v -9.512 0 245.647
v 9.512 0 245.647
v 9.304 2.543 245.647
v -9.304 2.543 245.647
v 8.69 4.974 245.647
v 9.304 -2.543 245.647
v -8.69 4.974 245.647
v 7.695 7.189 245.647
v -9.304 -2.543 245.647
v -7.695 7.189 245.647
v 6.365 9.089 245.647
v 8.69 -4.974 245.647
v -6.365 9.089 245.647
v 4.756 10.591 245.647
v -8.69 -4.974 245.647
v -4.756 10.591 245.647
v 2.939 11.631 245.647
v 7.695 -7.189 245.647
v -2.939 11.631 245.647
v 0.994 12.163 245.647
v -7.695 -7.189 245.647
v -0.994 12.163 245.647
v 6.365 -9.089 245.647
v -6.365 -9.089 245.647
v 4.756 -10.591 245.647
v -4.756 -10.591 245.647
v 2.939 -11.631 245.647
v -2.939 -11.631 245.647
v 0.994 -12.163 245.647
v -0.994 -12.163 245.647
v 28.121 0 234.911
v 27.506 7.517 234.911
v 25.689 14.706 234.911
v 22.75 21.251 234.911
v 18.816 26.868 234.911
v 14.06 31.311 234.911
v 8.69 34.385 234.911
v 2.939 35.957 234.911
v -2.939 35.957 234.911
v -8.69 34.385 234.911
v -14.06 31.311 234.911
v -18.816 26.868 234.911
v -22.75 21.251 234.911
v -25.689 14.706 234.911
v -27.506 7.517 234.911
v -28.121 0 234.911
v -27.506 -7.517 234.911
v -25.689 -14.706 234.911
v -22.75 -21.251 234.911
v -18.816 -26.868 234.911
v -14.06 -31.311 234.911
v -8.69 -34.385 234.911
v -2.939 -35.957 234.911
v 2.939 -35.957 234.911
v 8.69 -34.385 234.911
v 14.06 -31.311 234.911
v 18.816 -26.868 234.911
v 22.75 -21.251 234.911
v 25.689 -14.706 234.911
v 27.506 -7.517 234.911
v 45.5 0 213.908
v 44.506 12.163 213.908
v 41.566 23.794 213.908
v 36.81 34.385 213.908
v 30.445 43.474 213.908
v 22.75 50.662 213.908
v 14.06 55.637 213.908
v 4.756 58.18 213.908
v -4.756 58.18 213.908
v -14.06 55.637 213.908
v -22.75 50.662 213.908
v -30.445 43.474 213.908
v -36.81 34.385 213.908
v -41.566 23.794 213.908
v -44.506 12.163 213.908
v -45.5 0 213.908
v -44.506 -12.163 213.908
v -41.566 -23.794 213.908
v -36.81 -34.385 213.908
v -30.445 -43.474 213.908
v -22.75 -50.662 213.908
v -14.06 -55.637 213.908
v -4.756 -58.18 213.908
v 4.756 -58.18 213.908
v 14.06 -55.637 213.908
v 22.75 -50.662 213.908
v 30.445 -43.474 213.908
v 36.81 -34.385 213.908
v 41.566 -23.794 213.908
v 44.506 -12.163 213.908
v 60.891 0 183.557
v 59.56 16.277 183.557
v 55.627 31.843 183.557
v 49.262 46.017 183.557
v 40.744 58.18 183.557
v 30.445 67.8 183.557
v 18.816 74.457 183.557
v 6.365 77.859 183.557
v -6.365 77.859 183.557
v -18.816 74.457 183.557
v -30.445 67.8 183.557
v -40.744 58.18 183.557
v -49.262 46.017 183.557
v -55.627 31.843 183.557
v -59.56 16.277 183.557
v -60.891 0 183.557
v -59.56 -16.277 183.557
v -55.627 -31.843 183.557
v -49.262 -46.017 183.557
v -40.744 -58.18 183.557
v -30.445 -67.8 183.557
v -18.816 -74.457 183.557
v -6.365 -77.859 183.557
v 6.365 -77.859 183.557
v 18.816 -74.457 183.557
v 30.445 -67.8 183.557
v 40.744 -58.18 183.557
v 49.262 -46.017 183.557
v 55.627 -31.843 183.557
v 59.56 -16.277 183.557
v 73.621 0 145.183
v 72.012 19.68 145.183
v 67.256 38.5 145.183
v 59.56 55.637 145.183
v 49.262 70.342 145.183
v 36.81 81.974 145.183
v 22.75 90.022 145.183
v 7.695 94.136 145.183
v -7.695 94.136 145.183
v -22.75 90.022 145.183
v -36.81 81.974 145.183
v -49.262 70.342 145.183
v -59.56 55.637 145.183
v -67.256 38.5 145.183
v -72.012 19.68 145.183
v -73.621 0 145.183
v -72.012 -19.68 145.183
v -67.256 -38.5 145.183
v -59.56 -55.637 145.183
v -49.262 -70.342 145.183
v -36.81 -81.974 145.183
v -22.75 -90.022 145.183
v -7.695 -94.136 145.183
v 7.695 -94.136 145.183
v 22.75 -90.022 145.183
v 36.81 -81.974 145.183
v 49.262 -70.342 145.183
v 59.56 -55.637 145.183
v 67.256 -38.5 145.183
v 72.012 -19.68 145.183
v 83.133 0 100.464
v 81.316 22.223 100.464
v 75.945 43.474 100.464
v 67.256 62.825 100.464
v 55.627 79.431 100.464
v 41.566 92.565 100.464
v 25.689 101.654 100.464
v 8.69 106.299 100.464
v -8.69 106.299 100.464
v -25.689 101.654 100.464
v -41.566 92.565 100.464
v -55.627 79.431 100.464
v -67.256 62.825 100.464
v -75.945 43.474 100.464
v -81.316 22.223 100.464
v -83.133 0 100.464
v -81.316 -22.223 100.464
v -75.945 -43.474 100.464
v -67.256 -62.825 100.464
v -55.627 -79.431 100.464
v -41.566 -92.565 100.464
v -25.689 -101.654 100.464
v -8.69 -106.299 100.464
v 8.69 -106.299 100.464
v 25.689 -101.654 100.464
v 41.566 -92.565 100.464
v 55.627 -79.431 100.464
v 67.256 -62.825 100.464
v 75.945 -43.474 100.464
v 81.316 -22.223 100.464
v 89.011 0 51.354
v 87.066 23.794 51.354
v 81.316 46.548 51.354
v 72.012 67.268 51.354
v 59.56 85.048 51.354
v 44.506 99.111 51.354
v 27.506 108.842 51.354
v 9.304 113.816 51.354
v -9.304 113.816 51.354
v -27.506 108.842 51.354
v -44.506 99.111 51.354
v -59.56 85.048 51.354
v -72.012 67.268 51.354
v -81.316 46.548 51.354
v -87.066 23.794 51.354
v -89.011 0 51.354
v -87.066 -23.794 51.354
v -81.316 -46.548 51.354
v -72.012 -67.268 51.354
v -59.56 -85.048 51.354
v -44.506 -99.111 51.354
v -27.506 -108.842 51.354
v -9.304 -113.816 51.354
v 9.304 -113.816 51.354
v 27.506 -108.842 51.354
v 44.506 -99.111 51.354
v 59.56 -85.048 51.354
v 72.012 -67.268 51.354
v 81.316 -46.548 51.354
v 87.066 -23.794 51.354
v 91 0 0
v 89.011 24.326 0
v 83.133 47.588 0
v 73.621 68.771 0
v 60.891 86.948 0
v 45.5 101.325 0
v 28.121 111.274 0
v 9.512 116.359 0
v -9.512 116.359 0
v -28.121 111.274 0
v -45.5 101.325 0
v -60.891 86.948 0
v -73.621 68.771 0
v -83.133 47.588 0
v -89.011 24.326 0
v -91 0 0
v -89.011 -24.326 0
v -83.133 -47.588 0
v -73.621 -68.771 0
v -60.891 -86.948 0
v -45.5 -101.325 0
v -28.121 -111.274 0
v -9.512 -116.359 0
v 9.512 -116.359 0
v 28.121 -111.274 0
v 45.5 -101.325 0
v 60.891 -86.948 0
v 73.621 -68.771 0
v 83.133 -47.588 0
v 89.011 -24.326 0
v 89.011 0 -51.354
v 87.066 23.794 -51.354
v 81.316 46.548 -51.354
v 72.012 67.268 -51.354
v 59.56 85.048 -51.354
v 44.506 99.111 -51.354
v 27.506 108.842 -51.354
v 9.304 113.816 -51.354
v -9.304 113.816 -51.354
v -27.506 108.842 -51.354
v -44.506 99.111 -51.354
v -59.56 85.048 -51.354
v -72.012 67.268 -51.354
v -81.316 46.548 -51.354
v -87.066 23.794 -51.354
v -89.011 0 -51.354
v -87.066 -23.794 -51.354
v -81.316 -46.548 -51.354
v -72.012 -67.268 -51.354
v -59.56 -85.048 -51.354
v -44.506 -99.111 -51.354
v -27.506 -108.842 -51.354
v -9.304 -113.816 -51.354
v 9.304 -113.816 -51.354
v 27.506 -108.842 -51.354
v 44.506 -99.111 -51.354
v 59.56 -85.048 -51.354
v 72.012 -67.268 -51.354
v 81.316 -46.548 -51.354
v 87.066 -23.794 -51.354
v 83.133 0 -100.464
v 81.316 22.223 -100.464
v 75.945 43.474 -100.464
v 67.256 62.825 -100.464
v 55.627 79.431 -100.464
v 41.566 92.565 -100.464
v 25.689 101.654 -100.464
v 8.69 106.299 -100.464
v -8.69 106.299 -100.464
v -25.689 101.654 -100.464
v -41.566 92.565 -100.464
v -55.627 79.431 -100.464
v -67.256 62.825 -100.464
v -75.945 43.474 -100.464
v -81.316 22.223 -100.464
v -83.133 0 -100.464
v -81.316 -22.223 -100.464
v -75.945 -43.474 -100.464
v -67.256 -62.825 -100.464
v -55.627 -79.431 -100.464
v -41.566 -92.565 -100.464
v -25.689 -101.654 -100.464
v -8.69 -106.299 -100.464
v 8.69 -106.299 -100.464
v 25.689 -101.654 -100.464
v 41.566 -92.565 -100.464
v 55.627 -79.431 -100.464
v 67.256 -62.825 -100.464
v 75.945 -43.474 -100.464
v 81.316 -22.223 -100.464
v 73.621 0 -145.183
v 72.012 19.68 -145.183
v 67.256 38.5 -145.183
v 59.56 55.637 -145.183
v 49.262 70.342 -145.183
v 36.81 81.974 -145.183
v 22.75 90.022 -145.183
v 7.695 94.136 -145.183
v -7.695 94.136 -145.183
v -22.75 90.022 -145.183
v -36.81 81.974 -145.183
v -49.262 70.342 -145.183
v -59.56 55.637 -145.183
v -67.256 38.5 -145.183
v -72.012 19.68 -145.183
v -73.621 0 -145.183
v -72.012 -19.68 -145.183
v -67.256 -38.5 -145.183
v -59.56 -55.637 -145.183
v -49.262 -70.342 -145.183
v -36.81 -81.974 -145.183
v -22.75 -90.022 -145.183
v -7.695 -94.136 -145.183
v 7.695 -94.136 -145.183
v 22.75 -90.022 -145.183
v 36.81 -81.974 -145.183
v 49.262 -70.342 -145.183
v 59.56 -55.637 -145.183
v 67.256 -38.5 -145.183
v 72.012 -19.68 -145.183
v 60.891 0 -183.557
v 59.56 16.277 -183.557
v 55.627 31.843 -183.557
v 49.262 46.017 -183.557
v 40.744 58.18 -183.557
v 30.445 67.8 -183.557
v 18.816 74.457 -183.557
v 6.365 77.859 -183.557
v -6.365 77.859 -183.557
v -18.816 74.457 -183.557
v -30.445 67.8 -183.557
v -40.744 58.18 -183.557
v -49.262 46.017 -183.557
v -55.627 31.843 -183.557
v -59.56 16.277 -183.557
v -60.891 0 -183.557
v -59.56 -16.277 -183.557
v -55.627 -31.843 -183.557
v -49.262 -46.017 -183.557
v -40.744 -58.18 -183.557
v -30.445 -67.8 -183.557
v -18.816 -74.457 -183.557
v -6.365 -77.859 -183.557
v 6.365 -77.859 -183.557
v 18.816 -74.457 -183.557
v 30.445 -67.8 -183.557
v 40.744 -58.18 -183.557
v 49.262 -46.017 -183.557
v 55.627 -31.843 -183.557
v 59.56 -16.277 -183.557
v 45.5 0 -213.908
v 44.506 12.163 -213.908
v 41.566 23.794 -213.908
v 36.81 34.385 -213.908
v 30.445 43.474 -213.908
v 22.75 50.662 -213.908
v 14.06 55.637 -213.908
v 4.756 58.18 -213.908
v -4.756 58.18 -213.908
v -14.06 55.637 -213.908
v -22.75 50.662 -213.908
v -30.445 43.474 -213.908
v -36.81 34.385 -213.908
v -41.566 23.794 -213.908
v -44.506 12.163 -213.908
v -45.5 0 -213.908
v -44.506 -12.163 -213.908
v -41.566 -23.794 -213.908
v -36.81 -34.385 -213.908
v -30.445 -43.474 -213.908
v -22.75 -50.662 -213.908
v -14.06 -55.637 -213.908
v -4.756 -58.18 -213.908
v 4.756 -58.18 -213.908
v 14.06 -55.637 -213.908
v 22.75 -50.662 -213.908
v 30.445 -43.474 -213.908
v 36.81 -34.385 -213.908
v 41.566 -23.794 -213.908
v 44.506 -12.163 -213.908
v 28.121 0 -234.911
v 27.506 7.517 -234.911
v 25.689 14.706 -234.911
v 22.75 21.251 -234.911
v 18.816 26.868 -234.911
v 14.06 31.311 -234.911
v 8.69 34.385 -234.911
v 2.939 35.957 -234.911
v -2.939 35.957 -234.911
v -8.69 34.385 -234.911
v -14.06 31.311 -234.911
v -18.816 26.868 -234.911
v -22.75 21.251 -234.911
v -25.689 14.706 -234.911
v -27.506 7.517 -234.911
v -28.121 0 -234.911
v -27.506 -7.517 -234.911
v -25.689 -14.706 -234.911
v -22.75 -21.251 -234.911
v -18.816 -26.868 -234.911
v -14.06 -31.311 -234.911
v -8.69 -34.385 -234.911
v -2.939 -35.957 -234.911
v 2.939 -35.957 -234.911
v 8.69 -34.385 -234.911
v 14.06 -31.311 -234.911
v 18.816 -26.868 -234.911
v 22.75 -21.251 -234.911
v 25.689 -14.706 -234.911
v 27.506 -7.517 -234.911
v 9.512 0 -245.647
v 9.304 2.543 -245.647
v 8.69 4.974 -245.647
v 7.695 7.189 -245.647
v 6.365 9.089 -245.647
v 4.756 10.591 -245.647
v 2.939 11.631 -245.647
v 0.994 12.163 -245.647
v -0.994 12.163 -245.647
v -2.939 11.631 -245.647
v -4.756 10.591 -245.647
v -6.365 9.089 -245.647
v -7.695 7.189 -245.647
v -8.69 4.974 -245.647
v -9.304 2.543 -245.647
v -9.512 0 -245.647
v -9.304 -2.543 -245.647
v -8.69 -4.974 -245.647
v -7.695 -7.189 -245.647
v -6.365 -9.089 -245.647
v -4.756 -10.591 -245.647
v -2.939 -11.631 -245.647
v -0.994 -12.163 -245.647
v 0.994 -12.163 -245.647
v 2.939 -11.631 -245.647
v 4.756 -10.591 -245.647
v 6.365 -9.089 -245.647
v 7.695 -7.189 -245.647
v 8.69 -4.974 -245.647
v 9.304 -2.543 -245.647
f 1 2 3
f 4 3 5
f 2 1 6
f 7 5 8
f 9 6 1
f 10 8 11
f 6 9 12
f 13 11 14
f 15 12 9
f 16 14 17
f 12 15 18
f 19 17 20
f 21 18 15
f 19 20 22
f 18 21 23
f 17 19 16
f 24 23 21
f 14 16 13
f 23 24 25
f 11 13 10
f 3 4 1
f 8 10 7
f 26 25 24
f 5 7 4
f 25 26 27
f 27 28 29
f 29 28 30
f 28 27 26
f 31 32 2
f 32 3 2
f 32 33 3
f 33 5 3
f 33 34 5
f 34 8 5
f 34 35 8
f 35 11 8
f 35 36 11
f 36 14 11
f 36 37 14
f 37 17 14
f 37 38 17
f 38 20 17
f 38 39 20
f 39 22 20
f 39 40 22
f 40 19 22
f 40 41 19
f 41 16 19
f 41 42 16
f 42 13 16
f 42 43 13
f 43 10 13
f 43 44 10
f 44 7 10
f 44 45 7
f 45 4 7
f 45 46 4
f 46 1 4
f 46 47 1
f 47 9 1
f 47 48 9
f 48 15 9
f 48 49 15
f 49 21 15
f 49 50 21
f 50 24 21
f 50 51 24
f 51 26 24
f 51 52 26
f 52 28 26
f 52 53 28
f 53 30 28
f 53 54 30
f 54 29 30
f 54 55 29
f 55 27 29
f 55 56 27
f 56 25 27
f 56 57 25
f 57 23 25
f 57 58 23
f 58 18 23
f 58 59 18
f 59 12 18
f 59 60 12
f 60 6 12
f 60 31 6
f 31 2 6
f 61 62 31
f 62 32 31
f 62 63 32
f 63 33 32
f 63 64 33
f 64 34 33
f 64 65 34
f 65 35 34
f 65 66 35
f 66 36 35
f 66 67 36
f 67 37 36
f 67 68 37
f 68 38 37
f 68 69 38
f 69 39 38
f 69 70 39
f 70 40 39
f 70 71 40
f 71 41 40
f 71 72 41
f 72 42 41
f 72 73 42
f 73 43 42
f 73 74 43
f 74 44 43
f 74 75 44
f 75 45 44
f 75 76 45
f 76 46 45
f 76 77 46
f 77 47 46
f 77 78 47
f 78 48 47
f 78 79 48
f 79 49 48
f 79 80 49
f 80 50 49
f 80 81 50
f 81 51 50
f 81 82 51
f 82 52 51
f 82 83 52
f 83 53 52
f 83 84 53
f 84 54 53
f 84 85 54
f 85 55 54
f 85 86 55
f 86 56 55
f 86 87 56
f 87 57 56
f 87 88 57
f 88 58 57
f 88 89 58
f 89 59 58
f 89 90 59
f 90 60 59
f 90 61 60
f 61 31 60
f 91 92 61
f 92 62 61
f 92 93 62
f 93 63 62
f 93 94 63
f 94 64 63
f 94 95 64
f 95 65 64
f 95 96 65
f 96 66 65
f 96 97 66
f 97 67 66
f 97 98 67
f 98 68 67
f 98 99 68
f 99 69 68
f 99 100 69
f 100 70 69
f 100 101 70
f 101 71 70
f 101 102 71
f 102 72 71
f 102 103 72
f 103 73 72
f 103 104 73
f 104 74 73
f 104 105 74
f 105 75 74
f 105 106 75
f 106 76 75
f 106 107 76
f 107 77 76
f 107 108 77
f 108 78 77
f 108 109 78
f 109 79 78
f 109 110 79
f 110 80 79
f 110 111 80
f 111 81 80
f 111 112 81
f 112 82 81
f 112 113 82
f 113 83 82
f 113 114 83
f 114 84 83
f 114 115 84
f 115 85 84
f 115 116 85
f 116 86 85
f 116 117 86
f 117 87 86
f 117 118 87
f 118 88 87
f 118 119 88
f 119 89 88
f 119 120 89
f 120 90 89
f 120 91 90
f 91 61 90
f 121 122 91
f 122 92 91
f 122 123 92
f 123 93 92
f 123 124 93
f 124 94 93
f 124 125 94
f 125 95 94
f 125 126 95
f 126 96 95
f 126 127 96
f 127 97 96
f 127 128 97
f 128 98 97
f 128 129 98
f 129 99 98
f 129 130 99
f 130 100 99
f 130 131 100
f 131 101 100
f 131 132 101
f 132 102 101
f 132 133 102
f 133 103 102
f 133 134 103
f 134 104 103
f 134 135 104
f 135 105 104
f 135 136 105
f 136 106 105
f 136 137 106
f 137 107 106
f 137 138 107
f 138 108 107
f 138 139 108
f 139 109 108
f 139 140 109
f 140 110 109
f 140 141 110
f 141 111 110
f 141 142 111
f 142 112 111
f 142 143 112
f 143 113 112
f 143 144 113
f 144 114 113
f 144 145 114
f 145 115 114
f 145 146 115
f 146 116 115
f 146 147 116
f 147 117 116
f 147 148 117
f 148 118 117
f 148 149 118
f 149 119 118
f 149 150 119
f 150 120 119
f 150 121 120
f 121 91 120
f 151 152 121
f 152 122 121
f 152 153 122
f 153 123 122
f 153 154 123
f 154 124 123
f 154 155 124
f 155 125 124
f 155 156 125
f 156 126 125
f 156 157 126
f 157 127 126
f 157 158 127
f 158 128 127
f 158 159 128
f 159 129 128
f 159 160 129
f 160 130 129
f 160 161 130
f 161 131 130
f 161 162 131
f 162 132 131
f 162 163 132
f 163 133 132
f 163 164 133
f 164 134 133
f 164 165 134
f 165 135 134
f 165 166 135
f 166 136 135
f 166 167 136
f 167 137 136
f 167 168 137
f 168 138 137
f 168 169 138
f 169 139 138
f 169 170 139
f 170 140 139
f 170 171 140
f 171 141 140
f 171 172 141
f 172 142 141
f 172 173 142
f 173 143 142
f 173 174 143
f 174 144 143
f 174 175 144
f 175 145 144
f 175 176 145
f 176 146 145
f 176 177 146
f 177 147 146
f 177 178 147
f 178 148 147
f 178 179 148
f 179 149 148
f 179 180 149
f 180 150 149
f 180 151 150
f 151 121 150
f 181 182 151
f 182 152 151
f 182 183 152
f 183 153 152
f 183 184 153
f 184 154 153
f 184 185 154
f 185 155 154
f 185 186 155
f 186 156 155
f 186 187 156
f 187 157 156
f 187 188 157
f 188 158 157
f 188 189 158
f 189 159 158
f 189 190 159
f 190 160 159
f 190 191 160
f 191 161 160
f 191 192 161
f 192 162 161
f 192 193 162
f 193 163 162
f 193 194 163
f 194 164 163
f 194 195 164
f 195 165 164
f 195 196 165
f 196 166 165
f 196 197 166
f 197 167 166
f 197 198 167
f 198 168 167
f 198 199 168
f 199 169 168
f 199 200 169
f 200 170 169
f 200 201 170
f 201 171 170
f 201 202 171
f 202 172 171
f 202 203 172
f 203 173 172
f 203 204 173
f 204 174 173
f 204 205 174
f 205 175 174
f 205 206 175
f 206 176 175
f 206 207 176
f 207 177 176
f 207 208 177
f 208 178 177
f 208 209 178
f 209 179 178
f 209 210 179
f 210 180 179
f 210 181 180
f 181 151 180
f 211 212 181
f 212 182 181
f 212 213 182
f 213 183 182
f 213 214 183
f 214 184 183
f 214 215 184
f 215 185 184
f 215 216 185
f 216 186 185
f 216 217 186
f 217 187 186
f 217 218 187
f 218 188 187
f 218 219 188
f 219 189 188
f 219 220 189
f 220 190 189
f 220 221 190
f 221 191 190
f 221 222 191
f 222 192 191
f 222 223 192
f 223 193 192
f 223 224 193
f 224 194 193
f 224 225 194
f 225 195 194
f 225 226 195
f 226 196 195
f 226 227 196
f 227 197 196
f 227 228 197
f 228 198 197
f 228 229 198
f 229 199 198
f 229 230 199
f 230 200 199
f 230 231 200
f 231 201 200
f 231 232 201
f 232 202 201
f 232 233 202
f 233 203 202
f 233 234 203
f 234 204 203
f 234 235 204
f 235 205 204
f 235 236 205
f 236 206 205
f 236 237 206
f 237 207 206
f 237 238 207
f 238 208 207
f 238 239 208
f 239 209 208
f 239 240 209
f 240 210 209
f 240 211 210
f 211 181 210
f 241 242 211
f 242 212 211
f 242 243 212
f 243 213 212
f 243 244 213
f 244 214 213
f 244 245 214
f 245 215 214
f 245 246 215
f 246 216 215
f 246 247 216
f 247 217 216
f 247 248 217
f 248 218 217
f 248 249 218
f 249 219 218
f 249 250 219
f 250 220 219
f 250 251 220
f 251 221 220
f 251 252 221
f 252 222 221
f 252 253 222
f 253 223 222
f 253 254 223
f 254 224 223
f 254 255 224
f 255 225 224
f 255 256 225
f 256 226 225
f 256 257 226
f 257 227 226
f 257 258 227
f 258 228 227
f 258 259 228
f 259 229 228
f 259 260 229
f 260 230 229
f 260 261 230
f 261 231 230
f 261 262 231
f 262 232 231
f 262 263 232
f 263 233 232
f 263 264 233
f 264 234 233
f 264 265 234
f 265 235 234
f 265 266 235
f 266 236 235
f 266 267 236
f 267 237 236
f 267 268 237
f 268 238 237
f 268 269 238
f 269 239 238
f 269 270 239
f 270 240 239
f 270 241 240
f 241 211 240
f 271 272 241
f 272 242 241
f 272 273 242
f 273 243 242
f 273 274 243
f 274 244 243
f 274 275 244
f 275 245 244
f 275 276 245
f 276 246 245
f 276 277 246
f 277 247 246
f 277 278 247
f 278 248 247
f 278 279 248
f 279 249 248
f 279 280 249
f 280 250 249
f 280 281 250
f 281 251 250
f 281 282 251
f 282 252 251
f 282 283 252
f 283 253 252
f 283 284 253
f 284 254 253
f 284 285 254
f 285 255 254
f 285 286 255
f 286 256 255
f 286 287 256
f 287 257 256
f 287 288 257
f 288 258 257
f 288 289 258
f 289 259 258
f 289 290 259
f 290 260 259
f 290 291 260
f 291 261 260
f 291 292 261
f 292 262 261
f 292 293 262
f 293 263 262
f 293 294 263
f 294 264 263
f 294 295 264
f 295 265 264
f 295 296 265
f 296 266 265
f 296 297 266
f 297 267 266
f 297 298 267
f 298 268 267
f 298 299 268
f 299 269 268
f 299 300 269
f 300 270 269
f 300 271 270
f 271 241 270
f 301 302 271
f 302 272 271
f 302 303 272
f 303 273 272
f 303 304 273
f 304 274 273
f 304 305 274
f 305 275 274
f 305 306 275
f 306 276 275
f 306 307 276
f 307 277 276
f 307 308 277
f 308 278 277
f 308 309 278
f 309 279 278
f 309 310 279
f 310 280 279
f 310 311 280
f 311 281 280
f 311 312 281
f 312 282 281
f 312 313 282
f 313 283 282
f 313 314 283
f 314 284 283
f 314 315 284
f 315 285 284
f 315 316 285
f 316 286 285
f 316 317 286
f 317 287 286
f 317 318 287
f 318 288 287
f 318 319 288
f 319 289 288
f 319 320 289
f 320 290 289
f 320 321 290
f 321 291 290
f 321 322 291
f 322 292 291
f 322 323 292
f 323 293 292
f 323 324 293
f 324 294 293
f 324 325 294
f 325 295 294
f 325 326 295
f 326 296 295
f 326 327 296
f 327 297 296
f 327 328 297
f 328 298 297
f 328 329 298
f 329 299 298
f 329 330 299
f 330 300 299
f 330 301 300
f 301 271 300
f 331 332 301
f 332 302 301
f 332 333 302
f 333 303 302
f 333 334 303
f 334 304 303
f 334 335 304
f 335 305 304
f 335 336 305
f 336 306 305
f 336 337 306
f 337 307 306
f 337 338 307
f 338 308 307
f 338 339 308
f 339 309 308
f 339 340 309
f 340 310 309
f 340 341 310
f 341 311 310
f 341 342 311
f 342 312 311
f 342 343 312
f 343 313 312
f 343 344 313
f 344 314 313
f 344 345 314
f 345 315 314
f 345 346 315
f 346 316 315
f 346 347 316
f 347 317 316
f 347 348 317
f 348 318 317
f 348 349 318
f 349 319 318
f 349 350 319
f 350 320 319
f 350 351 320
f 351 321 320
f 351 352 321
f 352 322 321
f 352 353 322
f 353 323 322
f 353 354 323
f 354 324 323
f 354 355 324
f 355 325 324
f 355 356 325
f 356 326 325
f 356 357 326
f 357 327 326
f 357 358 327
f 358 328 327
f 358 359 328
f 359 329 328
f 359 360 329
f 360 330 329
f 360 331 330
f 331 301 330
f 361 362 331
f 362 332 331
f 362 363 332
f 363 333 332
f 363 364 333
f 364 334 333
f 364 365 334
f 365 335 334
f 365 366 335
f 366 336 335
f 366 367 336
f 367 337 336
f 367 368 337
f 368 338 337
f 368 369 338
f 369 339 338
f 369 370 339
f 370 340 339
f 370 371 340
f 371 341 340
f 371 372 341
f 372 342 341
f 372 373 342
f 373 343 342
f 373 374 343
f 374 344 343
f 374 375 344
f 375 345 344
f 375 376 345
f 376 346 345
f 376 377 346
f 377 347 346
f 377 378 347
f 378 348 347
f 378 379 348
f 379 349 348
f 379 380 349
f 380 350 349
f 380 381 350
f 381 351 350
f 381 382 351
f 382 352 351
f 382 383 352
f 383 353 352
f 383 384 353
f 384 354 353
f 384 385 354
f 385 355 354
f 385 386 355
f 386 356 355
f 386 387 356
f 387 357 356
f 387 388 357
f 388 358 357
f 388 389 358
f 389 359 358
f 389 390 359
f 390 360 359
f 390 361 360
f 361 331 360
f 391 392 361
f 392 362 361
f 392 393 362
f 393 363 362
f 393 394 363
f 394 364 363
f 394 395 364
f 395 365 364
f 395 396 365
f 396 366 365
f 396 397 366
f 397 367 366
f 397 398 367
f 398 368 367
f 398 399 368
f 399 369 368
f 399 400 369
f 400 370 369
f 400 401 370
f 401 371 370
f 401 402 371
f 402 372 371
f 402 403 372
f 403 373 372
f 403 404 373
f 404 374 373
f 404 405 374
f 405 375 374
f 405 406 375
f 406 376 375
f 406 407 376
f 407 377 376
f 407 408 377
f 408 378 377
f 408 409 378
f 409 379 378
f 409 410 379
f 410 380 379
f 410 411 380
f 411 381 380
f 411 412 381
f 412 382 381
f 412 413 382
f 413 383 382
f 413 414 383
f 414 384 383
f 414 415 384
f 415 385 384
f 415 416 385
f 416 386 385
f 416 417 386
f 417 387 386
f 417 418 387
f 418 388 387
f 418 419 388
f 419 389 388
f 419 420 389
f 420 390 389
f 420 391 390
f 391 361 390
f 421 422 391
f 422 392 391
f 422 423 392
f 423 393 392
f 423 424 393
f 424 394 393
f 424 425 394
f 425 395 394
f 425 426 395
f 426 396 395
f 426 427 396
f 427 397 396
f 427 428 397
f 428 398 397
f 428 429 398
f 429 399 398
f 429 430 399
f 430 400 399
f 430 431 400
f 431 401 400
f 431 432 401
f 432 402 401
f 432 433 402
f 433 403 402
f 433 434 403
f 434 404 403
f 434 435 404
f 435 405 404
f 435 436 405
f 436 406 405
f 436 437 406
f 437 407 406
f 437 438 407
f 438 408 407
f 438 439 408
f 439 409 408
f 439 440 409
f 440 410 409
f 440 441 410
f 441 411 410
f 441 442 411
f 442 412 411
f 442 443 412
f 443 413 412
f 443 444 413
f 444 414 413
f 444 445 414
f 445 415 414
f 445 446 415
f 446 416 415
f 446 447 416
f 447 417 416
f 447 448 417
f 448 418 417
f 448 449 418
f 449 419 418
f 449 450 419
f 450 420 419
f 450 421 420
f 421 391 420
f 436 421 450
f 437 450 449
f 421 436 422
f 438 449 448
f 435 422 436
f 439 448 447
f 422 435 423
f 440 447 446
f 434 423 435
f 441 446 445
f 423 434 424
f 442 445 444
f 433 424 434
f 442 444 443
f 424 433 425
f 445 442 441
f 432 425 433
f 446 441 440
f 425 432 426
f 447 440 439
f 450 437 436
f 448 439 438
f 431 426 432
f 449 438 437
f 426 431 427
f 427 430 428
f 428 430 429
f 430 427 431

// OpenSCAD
// Generated by SolidPython 1.0.1 on 2020-07-29 00:46:47


scale(v = [7, 9, 19]) {
	sphere(r = 13);
}
/***********************************************
*********      SolidPython code:      **********
************************************************
 
# import packages: SolidPython
from solid import *
from solid.utils import *
from itertools import chain, combinations, permutations


class Resize:

    def __init__(self, scad_file):
        self.scad_file = scad_file
        #self.scad_file = import_scad(scad_file)
        # cone/cylinder param:
        self.r1 = 0
        self.r2 = 0
        self.h = 0
        # rectangular prism param:
        self.w = 0
        self.l = 0
        # ellipse param:
        self.r = 0

    # import OpenScad code (file name corresponds to shape)


    # classify shape + parameters
    def assign(self, param1, param2, param3):
        if self.scad_file == 'cone.scad':
            self.r1 = param1
            self.r2 = param2
            self.h = param3
        elif self.scad_file == 'cylinder.scad':
            self.r1 = param1
            self.r2 = param2
            self.h = param3
        elif self.scad_file == 'rectangularPrism.scad':
            self.h = param1
            self.l = param2
            self.w = param3
        else:
            self.r = param1
            self.h = param2

    # resize parameters
    def iterate(self):
        x = range(3, 20, 2)
        i = 1
        if self.scad_file == 'cone.scad':
            tempList = list(permutations(x, 2))
            for temp in tempList:
                param1 = temp[0]
                param2 = temp[1]
                filepath = 'produced_scad_files/' + 'cone' + str(param1) + '_' + str(param2) + '_' + '.scad'
                scad_render_to_file(cylinder(h=param1, r1=param2, r2=0), filepath)

        elif self.scad_file == 'cylinder.scad':
            tempList = list(permutations(x, 3))
            for temp in tempList:
                param1 = temp[0]
                param2 = temp[1]
                filepath = 'produced_scad_files/' + 'cylinder' + str(param1) + '_' + str(param2) + '_' + '.scad'
                scad_render_to_file(cylinder(h=param1, r1=param2, r2=param2), filepath)

        elif self.scad_file == 'rectangularPrism.scad':
            tempList = list(permutations(x, 3))
            for temp in tempList:
                param1 = temp[0]
                param2 = temp[1]
                param3 = temp[2]
                filepath = 'produced_scad_files/' + 'rectangularPrism' + str(param1) + '_' + str(param2) + '_' + str(
                    param3) + '.scad'
                scad_render_to_file(cube(size=(param1, param2, param3)), filepath)

        elif self.scad_file == 'ellipse.scad':
            tempList = list(permutations(x, 4))
            for temp in tempList:
                param1 = temp[0]
                param2 = temp[1]
                param3 = temp[2]
                param4 = temp[3]
                filepath = 'produced_scad_files/' + 'ellipse' + str(param1) + '_' + str(param2) + '_' + str(param3) + '_' + str(param4) + '.scad'
                scad_render_to_file(scale([param1, param2, param3])(sphere(r=param4)), filepath)

    def render_to_scadfile(self):
        scad_render_to_file(scad, 'example.scad') 
 
************************************************/
